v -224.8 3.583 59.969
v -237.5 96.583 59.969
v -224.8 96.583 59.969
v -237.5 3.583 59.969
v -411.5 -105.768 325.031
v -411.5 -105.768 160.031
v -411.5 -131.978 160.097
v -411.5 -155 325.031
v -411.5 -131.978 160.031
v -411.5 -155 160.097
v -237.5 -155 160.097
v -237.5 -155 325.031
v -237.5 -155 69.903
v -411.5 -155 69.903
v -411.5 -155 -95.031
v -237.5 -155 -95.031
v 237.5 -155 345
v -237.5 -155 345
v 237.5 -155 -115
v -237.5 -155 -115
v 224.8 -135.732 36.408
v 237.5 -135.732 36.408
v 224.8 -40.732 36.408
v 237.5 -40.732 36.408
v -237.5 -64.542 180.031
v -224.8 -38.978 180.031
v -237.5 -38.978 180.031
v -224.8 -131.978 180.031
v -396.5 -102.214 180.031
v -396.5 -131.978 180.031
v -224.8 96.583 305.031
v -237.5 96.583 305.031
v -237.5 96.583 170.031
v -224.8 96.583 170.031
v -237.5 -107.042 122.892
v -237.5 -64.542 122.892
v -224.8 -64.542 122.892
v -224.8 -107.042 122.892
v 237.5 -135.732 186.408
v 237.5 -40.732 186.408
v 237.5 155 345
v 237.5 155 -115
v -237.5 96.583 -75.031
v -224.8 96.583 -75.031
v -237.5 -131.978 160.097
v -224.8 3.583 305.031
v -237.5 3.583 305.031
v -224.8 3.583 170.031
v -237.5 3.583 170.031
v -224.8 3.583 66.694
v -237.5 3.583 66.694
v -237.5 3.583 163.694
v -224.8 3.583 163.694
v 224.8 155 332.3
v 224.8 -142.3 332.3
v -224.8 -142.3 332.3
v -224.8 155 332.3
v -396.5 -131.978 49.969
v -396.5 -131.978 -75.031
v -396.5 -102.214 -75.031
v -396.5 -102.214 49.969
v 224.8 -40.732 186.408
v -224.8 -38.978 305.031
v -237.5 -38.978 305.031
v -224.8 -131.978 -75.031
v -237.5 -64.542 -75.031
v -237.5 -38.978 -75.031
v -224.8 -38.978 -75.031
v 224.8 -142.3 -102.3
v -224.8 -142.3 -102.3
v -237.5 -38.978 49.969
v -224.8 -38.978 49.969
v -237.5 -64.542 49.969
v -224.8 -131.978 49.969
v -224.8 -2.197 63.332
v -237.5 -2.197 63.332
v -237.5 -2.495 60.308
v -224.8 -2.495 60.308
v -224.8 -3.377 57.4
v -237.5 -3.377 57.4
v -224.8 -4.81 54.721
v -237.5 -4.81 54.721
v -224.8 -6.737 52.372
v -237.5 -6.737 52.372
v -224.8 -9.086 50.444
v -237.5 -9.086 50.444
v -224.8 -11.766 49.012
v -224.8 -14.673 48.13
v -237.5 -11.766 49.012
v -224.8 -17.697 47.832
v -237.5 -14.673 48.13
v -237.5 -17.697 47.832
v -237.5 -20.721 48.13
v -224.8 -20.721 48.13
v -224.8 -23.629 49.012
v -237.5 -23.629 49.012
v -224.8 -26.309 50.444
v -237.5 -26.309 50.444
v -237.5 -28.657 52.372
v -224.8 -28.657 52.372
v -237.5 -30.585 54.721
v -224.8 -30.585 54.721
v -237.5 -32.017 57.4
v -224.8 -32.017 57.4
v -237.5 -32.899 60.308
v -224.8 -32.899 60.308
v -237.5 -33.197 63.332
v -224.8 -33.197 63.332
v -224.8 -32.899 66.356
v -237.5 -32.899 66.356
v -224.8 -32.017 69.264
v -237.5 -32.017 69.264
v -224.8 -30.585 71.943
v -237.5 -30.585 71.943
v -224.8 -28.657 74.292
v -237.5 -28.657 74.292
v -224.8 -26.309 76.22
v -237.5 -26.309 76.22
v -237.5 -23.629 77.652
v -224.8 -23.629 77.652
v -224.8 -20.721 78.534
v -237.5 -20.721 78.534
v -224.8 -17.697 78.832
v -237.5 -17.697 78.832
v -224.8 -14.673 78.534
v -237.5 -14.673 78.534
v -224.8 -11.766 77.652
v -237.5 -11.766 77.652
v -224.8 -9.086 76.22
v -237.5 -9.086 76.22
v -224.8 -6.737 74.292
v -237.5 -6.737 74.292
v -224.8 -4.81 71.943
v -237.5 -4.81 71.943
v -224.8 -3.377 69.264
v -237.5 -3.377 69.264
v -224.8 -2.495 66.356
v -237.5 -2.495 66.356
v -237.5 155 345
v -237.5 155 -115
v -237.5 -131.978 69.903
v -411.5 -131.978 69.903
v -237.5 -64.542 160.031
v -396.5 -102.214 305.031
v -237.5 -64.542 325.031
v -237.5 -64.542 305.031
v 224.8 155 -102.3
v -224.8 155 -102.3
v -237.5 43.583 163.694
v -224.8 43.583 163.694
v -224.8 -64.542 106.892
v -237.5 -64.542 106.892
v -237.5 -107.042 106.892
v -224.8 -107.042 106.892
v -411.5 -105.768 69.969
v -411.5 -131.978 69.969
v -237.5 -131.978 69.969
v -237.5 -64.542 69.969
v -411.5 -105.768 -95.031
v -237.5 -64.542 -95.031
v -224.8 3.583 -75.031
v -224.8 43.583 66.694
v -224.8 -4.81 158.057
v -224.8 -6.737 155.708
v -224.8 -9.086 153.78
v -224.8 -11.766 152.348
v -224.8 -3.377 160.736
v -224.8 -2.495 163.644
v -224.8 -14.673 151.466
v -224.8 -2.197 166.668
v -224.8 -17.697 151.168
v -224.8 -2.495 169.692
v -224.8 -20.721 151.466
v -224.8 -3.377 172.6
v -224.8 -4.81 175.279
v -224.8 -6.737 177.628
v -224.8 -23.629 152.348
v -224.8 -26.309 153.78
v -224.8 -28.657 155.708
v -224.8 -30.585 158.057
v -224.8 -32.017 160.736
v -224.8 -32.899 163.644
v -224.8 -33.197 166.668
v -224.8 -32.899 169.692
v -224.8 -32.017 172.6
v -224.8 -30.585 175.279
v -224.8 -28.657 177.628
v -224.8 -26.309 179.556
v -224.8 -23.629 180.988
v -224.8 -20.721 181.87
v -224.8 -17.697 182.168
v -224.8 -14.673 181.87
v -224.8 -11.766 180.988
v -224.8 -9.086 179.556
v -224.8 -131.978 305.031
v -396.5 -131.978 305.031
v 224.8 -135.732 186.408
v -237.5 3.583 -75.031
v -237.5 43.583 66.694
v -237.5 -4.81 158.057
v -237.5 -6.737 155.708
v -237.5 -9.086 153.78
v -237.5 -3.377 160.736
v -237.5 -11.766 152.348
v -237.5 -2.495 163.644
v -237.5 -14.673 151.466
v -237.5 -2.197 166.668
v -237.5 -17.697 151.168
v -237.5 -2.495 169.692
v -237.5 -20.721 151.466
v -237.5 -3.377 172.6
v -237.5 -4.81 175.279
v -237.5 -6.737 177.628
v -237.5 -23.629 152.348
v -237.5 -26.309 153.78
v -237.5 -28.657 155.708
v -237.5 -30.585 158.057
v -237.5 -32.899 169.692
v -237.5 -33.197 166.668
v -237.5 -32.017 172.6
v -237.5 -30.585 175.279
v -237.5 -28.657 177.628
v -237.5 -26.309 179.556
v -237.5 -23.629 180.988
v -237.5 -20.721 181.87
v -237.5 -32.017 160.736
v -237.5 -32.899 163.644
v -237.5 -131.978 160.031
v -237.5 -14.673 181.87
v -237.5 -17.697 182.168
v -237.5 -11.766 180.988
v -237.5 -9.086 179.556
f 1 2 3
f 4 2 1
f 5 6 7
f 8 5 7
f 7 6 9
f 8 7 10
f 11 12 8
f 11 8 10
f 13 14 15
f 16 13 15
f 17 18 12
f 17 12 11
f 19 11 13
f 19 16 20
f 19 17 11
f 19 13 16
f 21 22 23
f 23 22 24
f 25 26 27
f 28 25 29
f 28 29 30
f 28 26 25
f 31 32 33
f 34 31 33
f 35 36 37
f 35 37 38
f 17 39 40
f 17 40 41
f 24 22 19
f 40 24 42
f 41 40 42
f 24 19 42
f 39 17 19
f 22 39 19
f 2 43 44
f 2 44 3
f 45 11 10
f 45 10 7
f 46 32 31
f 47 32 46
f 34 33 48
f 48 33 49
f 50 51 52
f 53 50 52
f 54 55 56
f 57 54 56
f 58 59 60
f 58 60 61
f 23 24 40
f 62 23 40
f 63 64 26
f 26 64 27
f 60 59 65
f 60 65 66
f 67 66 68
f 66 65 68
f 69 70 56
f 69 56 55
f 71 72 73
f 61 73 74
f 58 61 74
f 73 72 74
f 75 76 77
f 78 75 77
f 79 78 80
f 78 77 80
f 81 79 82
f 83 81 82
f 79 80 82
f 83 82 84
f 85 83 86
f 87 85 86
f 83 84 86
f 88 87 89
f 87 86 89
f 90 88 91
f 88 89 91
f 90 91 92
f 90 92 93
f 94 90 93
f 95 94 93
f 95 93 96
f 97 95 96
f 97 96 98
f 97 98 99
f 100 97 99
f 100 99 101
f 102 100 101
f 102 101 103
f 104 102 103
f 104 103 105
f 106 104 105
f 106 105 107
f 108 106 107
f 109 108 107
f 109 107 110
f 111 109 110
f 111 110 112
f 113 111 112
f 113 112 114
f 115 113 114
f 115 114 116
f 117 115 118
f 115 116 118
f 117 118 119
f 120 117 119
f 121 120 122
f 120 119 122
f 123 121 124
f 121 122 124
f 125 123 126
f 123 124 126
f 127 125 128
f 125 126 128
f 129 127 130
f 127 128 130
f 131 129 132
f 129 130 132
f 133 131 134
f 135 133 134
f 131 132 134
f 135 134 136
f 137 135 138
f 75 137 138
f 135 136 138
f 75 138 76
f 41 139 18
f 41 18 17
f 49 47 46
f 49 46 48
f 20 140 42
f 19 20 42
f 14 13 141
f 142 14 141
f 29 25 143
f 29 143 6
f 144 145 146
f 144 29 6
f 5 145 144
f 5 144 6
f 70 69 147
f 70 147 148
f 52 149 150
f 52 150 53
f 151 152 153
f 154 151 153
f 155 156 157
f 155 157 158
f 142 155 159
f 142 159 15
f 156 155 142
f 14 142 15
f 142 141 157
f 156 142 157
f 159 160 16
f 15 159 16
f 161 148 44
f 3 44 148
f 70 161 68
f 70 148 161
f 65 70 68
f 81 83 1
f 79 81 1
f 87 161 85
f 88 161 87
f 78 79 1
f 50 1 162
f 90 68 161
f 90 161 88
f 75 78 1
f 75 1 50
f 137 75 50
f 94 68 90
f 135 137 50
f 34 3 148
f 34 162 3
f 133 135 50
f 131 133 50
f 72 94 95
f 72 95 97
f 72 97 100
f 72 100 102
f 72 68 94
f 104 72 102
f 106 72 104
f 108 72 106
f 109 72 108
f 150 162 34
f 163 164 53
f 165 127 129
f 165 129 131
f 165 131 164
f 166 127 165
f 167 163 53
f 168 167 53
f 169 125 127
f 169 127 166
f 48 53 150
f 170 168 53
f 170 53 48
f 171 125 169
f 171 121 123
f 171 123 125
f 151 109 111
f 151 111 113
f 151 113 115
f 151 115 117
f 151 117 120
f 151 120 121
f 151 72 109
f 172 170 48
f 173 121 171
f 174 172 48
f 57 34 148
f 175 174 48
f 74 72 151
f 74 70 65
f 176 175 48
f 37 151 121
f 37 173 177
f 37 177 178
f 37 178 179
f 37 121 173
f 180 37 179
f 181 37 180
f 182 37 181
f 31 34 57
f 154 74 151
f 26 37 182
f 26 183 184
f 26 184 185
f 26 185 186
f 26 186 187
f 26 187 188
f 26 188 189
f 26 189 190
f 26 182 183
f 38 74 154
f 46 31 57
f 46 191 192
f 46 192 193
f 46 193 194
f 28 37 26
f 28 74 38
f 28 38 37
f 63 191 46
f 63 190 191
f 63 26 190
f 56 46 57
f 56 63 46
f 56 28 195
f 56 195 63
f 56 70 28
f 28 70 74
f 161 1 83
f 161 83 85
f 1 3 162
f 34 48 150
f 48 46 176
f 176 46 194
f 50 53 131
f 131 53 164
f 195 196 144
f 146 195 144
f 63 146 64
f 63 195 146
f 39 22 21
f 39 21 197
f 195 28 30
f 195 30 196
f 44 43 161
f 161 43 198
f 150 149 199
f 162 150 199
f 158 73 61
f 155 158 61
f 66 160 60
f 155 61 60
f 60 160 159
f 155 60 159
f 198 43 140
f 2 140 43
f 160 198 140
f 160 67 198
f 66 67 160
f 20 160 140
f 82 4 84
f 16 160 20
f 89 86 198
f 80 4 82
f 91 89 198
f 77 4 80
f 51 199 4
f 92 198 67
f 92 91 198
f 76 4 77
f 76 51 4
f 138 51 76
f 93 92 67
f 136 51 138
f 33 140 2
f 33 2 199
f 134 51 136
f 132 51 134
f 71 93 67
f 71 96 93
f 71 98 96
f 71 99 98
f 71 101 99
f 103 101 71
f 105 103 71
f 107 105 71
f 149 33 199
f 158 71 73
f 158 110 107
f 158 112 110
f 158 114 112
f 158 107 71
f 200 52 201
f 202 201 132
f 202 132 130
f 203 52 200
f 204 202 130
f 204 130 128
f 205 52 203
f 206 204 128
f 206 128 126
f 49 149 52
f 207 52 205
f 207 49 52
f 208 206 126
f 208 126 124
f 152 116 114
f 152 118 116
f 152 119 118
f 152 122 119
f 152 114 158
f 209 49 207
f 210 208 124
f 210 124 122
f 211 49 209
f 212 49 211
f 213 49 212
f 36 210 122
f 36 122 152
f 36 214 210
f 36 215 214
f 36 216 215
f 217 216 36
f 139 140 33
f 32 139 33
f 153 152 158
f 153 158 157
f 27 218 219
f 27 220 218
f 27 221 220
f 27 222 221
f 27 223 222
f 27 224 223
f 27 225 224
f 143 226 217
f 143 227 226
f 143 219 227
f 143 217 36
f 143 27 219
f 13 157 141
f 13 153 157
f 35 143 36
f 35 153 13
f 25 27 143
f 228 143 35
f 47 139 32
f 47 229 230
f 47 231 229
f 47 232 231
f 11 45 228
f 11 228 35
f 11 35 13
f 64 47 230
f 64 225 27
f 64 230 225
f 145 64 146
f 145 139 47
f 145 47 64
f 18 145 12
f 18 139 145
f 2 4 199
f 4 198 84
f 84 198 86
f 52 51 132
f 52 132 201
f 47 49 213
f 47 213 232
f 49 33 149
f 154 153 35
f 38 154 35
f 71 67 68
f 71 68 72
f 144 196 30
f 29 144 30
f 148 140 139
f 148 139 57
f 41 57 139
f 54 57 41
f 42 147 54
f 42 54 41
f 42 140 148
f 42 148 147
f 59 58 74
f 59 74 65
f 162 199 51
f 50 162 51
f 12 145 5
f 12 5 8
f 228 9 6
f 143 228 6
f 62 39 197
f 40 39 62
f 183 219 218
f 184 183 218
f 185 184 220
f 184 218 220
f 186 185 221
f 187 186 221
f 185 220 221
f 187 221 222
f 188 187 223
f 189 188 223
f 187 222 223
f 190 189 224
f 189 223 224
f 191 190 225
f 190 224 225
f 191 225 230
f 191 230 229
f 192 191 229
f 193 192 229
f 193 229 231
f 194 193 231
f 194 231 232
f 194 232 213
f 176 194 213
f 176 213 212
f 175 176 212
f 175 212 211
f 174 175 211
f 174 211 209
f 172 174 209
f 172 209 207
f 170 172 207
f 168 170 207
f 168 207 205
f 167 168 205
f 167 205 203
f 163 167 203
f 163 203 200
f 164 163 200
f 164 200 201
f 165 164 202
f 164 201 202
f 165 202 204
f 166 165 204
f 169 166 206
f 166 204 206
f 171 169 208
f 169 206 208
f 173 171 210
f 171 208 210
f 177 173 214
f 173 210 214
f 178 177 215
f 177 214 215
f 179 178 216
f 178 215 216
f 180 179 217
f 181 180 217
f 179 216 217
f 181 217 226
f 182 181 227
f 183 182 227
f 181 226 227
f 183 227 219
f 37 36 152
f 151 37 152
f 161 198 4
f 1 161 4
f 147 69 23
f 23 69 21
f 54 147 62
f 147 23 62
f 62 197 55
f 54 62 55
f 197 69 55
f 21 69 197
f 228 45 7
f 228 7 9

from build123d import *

# Parameters (mm, degrees)
F0_W      = 475
F0_H      = 310
F1_DEPTH  = 115
F2_T      = -12.7
F3_W      = 93
F3_H      = 125
F3_H_2    = 135
F4_DEPTH  = 25
F5_DEPTH  = 25
F7_DEPTH  = 174
F8_W      = 15
F8_H      = 125
F10_DEPTH = 35
F11_DEPTH = 363
F13_W     = 42.5
F13_H     = 7.8922572035
F13_W_2   = 40
F13_H_2   = 48.3056434989
F13_H_3   = 48.6943565011
F13_H_4   = 8.1077427965
F14_DEPTH = 25
F15_W     = 95
F15_H     = 150
F16_DEPTH = 25
F13_R     = 15.5
F17_DEPTH = 25


# Not quite as in the source:
# - a feature names something its author has since deleted; it is built from what else it names


with BuildPart() as f1:
    # F0 (on Top) → F1 (new body, symmetric)
    with BuildSketch(Plane.XY):
        Rectangle(F0_W, F0_H)
    extrude(amount=F1_DEPTH, both=True)

    # F2
    f2_openings = [f1.faces().sort_by_distance(p)[0] for p in [
        (0, 0, 115),
    ]]
    offset(amount=F2_T, openings=f2_openings)

    # F3 (on face) → F4 (cut)
    with BuildSketch(Plane(origin=(-237.5, 0, 0), x_dir=(0, -1, 0), z_dir=(-1, 0, 0))):
        with Locations((85.4776808544, -12.5305280089)):
            Rectangle(F3_W, F3_H)
        with Locations((-50.0830374043, -7.5305280089)):
            Rectangle(F3_W, F3_H_2)
    extrude(amount=-F4_DEPTH, mode=Mode.SUBTRACT)

    # F5 (cut): a face of the model
    f5_faces = [f1.faces().sort_by_distance(p)[0] for p in [
        (0, 142.3, 6.35),
    ]]
    extrude(f5_faces, amount=-F5_DEPTH, mode=Mode.SUBTRACT)

    # F6 (on face) → F7 (join)
    with BuildSketch(Plane(origin=(-237.5, 0, 0), x_dir=(0, -1, 0), z_dir=(-1, 0, 0))):
        Polygon((131.9776808544, -75.0305280089), (38.9776808544, -75.0305280089), (38.9776808544, -95.0305280089), (131.9776808544, -95.0305280089), (155, -95.0305280089), (155, 69.9025020003), (131.9776808544, 69.9025020003), (131.9776808544, 69.9694719911), (38.9776808544, 69.9694719911), (38.9776808544, 49.9694719911), (131.9776808544, 49.9694719911), align=None)
    extrude(amount=F7_DEPTH)

    # F8 (on face) → F10 (join)
    with BuildSketch(Plane(origin=(0, -131.9776808544, 0), x_dir=(-1, 0, 0), z_dir=(0, 1, 0))):
        with Locations((404, -12.5305280089)):
            Rectangle(F8_W, F8_H)
    extrude(amount=F10_DEPTH)

    # F9 (on face) → F11 (cut)
    with BuildSketch(Plane(origin=(0, 0, -95.0305280089), x_dir=(1, 0, 0), z_dir=(0, 0, -1))):
        Polygon((-411.5, 38.9776808544), (-237.5, 38.9776808544), (-237.5, 64.5424127579), (-411.5, 105.7684645057), align=None)
    extrude(amount=-F11_DEPTH, mode=Mode.SUBTRACT)

    # F12: F1 across face


with BuildPart() as f1_1:
    add(f1.part)
    add(f1.part.mirror(Plane(origin=(0, -62.4841436051, 115), x_dir=(1, 0, 0), z_dir=(0, 0, 1))))

    # F13 (on face) → F14 (cut)
    with BuildSketch(Plane(origin=(-237.5, 0, 0), x_dir=(0, -1, 0), z_dir=(-1, 0, 0))):
        with Locations((85.7924127579, 118.9461286017)):
            Rectangle(F13_W, F13_H)
        with Locations((-23.5830374043, 90.8471782506)):
            Rectangle(F13_W_2, F13_H_2)
        with Locations((-23.5830374043, 139.3471782506)):
            Rectangle(F13_W_2, F13_H_3)
        with Locations((85.7924127579, 110.9461286017)):
            Rectangle(F13_W, F13_H_4)
    extrude(amount=-F14_DEPTH, mode=Mode.SUBTRACT)

    # F15 (on face) → F16 (cut)
    with BuildSketch(Plane.YZ.offset(237.5)):
        with Locations((-88.2316343486, 111.4078534107)):
            Rectangle(F15_W, F15_H)
    extrude(amount=-F16_DEPTH, mode=Mode.SUBTRACT)

    # F13 (on face) → F17 (cut)
    with BuildSketch(Plane(origin=(-237.5, 0, 0), x_dir=(0, -1, 0), z_dir=(-1, 0, 0))):
        with Locations((17.697321725, 166.6680857539)):
            Circle(F13_R)
        with BuildLine():
            ThreePointArc((33.197321725, 63.3319142461), (17.697321725, 78.8319142461), (2.197321725, 63.3319142461))
            Line((2.197321725, 63.3319142461), (17.697321725, 63.3319142461))
            Line((17.697321725, 63.3319142461), (33.197321725, 63.3319142461))
        make_face()
        with BuildLine():
            Line((17.697321725, 63.3319142461), (2.197321725, 63.3319142461))
            ThreePointArc((2.197321725, 63.3319142461), (17.697321725, 47.8319142461), (33.197321725, 63.3319142461))
            Line((33.197321725, 63.3319142461), (17.697321725, 63.3319142461))
        make_face()
    extrude(amount=-F17_DEPTH, mode=Mode.SUBTRACT)


solid = f1_1.part
